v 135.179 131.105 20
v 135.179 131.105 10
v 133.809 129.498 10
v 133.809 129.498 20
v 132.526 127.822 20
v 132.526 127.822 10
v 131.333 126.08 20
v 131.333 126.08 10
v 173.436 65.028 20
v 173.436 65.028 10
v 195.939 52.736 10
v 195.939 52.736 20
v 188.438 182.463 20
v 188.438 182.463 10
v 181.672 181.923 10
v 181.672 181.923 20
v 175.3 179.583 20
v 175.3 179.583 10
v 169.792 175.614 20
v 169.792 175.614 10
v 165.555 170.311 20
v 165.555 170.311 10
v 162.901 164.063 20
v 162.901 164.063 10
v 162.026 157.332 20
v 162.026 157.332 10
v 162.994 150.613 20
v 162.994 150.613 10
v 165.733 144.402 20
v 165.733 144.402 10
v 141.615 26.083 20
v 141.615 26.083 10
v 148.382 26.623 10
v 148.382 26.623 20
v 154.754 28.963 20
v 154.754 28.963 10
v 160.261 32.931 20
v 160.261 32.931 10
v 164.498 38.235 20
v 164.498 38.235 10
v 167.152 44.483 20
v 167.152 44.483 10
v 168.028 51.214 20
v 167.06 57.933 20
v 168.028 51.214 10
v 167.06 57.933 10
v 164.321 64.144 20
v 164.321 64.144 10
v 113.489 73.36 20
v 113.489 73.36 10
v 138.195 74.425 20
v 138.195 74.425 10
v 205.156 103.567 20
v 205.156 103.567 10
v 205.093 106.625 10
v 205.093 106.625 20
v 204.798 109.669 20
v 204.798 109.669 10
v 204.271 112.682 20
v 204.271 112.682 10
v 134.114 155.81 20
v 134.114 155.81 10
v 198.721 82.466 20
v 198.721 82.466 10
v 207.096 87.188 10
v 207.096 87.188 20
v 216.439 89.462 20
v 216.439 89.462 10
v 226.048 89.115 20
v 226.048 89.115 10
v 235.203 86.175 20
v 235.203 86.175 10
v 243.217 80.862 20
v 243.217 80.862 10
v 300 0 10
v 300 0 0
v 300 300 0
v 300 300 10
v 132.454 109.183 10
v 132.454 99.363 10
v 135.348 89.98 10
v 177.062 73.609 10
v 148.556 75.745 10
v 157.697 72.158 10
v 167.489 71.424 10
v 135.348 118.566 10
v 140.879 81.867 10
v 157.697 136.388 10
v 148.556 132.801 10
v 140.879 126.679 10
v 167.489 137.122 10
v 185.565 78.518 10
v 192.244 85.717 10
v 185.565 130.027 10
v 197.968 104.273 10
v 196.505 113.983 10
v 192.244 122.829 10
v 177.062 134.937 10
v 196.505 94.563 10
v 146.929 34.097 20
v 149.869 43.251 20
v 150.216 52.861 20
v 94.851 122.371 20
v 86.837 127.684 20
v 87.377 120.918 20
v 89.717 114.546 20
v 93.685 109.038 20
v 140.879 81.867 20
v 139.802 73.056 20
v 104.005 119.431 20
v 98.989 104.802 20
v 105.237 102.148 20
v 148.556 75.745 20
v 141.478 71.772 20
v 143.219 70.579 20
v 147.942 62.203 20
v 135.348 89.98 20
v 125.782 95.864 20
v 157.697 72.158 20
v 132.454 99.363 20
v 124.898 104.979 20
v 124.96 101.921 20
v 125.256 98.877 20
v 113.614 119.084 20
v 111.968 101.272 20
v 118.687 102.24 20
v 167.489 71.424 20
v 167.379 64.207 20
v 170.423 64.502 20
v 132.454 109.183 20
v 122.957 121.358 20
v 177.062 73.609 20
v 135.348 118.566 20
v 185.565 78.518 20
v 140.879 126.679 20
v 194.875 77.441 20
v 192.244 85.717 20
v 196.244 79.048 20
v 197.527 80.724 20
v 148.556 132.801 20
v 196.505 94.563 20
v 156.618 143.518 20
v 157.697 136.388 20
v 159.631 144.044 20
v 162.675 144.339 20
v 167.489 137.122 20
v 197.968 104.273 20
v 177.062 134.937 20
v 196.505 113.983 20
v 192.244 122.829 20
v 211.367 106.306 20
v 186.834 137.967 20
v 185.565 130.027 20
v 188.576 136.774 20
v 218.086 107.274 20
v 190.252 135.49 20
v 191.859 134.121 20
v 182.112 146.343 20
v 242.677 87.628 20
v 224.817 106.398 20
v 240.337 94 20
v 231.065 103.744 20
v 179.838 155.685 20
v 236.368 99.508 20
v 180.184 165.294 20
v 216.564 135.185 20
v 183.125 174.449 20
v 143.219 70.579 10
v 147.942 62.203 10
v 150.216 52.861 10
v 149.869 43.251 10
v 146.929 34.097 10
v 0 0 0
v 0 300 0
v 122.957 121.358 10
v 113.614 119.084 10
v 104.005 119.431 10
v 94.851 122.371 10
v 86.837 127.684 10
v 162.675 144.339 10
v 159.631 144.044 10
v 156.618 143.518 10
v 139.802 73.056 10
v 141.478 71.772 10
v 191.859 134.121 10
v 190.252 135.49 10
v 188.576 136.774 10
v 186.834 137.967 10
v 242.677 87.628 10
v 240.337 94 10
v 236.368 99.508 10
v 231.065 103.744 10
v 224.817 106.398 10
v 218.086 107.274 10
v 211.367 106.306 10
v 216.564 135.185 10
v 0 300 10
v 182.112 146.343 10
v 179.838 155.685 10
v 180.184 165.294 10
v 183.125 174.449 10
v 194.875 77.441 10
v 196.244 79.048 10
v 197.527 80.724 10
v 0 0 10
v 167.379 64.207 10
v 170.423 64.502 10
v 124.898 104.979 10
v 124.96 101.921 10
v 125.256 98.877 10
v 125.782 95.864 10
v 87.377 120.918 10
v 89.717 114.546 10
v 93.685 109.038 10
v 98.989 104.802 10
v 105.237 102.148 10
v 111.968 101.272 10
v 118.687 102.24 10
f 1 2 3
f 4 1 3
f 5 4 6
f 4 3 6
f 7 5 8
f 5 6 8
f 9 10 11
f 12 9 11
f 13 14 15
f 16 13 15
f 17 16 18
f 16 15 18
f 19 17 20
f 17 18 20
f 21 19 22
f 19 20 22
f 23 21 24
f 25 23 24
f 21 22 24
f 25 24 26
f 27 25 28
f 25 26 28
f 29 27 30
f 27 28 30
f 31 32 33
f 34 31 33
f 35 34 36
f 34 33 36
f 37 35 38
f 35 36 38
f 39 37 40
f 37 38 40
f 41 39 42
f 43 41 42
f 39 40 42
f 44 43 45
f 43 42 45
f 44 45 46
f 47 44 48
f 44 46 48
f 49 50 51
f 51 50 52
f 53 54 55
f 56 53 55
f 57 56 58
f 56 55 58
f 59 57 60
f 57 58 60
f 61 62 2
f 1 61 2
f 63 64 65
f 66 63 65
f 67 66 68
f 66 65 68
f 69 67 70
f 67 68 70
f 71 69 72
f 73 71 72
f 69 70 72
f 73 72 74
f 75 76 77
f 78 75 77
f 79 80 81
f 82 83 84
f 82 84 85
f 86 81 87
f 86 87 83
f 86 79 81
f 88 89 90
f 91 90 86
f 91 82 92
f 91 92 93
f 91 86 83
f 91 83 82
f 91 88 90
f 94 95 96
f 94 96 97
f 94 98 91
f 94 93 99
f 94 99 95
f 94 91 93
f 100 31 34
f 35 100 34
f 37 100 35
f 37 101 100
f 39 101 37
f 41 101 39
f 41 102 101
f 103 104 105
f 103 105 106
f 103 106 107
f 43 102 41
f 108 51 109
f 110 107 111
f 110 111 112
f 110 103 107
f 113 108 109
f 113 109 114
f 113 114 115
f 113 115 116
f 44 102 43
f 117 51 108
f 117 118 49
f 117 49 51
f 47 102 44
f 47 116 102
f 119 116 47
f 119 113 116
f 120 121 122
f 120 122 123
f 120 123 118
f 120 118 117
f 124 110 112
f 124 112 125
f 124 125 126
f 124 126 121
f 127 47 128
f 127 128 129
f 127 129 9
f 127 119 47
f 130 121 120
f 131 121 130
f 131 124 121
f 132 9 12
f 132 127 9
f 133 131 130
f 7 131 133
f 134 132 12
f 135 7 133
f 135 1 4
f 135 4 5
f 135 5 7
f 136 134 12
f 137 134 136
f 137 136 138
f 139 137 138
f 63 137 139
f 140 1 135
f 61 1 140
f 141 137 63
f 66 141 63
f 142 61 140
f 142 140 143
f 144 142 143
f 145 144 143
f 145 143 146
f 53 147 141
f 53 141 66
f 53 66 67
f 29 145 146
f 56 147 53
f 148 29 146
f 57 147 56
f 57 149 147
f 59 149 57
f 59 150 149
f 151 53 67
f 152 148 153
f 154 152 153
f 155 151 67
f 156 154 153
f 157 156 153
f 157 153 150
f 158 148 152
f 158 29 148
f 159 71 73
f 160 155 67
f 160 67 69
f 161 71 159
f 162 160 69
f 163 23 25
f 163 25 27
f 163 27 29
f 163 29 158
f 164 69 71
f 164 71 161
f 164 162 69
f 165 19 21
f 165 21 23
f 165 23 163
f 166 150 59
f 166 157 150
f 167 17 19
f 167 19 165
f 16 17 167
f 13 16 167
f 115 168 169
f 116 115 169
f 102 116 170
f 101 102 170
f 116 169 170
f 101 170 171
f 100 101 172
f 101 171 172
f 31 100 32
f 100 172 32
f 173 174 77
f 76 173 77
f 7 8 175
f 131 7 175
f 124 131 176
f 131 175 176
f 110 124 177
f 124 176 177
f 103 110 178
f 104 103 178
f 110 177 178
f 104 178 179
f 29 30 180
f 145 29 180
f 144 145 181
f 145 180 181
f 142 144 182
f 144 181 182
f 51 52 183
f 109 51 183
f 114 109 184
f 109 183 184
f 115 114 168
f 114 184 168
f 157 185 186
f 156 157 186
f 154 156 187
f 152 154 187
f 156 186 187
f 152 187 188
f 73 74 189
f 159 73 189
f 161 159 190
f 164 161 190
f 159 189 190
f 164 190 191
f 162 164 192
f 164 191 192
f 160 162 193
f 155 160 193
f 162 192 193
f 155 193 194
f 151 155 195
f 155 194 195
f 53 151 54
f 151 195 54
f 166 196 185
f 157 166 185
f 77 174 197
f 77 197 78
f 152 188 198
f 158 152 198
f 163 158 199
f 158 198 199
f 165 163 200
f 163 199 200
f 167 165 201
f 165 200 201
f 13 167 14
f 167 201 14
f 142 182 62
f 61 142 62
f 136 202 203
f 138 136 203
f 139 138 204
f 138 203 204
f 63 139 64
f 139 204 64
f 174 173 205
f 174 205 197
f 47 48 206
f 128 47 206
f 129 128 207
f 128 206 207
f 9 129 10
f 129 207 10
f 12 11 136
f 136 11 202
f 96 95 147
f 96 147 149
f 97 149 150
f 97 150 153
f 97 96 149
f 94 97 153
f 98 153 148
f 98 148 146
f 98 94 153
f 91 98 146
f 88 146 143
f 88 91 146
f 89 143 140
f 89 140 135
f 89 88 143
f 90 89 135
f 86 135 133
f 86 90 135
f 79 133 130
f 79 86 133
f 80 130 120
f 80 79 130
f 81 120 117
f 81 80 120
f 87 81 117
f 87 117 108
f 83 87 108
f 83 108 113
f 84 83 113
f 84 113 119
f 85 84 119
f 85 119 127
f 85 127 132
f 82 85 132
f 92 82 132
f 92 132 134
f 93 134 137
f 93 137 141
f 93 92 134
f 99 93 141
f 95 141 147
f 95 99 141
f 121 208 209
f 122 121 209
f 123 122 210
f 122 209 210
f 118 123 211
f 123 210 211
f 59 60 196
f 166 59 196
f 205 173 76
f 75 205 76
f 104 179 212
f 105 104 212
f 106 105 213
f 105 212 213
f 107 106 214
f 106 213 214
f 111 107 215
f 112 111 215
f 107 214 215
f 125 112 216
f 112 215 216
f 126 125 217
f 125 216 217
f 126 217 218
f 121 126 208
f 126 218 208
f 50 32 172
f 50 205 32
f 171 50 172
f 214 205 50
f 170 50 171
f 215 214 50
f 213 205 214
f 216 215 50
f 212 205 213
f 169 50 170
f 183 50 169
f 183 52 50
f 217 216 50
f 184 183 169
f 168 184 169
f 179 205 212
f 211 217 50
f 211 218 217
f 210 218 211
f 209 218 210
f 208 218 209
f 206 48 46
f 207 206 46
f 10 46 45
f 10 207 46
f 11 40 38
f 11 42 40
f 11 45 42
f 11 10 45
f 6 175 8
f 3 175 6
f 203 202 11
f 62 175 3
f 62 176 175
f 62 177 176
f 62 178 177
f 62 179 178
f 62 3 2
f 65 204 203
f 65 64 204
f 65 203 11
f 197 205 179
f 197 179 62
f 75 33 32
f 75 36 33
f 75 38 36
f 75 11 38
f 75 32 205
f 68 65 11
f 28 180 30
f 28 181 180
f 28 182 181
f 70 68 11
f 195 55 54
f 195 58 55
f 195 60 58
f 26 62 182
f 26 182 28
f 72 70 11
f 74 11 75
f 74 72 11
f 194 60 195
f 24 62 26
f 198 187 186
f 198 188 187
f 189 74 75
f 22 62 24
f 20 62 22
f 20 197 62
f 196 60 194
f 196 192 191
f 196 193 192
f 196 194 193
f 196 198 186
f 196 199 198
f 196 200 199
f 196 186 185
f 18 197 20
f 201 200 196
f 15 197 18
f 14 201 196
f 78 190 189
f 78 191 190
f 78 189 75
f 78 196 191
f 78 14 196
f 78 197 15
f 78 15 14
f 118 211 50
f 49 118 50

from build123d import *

# Parameters (mm, degrees)
SKICA1_W                = 300
SKICA1_H                = 300
P_IDAT_VYSUNUT_M1_DEPTH = 10
SKICA3_R                = 40.135302542
SKICA3_R_2              = 32.941200184
P_IDAT_VYSUNUT_M3_DEPTH = 10


with BuildPart() as part:
    # Skica1 → Přidat vysunutím1 (new body)
    with BuildSketch(Plane.XY):
        with Locations((150, 150)):
            Rectangle(SKICA1_W, SKICA1_H)
    extrude(amount=P_IDAT_VYSUNUT_M1_DEPTH)

    # Skica3 → Přidat vysunutím3 (add)
    # profile 1 of 9: a face of its own
    with BuildSketch(Plane.XY.offset(10)):
        with Locations((165.026842843, 104.272964979)):
            Circle(SKICA3_R)
        with Locations((165.026842843, 104.272964979)):
            Circle(SKICA3_R_2, mode=Mode.SUBTRACT)
    # profile 2 of 9: a face of its own
    with BuildSketch(Plane.XY.offset(10)):
        with BuildLine():
            Line((134.114323402, 155.810428325), (135.178982609, 131.104807063))
            ThreePointArc((135.178982609, 131.104807063), (144.916831788, 139.006665697), (156.618002898, 143.517504994))
            Line((156.618002898, 143.517504994), (134.114323402, 155.810428325))
        make_face()
    # profile 3 of 9: a face of its own
    with BuildSketch(Plane.XY.offset(10)):
        with BuildLine():
            ThreePointArc((188.438271645, 182.463164069), (165.555400469, 170.31094498), (165.733072295, 144.402053558))
            ThreePointArc((165.733072295, 144.402053558), (176.734461574, 142.662731504), (186.834212062, 137.966898527))
            ThreePointArc((186.834212062, 137.966898527), (179.680788671, 160.50181988), (188.438271645, 182.463164069))
        make_face()
    # profile 4 of 9: a face of its own
    with BuildSketch(Plane.XY.offset(10)):
        with BuildLine():
            Line((216.564306188, 135.185484421), (191.858684926, 134.120825214))
            ThreePointArc((191.858684926, 134.120825214), (199.76054356, 124.382976034), (204.271382857, 112.681804924))
            Line((204.271382857, 112.681804924), (216.564306188, 135.185484421))
        make_face()
    # profile 5 of 9: a face of its own
    with BuildSketch(Plane.XY.offset(10)):
        with BuildLine():
            ThreePointArc((243.217041932, 80.861536177), (231.064822844, 103.744407353), (205.155931421, 103.566735527))
            ThreePointArc((205.155931421, 103.566735527), (203.416609367, 92.565346248), (198.72077639, 82.46559576))
            ThreePointArc((198.72077639, 82.46559576), (221.255697743, 89.619019151), (243.217041932, 80.861536177))
        make_face()
    # profile 6 of 9: a face of its own
    with BuildSketch(Plane.XY.offset(10)):
        with BuildLine():
            ThreePointArc((194.874703077, 77.441122896), (185.136853898, 69.539264262), (173.435682787, 65.028424965))
            Line((173.435682787, 65.028424965), (195.939362284, 52.735501634))
            Line((195.939362284, 52.735501634), (194.874703077, 77.441122896))
        make_face()
    # profile 7 of 9: a face of its own
    with BuildSketch(Plane.XY.offset(10)):
        with BuildLine():
            ThreePointArc((164.32061339, 64.143876401), (153.319224112, 65.883198455), (143.219473624, 70.579031432))
            ThreePointArc((143.219473624, 70.579031432), (150.372897014, 48.044110079), (141.615414041, 26.08276589))
            ThreePointArc((141.615414041, 26.08276589), (164.498285217, 38.234984979), (164.32061339, 64.143876401))
        make_face()
    # profile 8 of 9: a face of its own
    with BuildSketch(Plane.XY.offset(10)):
        with BuildLine():
            ThreePointArc((138.195000759, 74.425104745), (130.293142125, 84.162953925), (125.782302829, 95.864125035))
            Line((125.782302829, 95.864125035), (113.489379497, 73.360445538))
            Line((113.489379497, 73.360445538), (138.195000759, 74.425104745))
        make_face()
    # profile 9 of 9: a face of its own
    with BuildSketch(Plane.XY.offset(10)):
        with BuildLine():
            ThreePointArc((124.897754265, 104.979194432), (126.637076319, 115.980583711), (131.332909296, 126.080334199))
            ThreePointArc((131.332909296, 126.080334199), (108.797987942, 118.926910808), (86.836643754, 127.684393782))
            ThreePointArc((86.836643754, 127.684393782), (98.988862842, 104.801522606), (124.897754265, 104.979194432))
        make_face()
    extrude(amount=P_IDAT_VYSUNUT_M3_DEPTH)


solid = part.part
